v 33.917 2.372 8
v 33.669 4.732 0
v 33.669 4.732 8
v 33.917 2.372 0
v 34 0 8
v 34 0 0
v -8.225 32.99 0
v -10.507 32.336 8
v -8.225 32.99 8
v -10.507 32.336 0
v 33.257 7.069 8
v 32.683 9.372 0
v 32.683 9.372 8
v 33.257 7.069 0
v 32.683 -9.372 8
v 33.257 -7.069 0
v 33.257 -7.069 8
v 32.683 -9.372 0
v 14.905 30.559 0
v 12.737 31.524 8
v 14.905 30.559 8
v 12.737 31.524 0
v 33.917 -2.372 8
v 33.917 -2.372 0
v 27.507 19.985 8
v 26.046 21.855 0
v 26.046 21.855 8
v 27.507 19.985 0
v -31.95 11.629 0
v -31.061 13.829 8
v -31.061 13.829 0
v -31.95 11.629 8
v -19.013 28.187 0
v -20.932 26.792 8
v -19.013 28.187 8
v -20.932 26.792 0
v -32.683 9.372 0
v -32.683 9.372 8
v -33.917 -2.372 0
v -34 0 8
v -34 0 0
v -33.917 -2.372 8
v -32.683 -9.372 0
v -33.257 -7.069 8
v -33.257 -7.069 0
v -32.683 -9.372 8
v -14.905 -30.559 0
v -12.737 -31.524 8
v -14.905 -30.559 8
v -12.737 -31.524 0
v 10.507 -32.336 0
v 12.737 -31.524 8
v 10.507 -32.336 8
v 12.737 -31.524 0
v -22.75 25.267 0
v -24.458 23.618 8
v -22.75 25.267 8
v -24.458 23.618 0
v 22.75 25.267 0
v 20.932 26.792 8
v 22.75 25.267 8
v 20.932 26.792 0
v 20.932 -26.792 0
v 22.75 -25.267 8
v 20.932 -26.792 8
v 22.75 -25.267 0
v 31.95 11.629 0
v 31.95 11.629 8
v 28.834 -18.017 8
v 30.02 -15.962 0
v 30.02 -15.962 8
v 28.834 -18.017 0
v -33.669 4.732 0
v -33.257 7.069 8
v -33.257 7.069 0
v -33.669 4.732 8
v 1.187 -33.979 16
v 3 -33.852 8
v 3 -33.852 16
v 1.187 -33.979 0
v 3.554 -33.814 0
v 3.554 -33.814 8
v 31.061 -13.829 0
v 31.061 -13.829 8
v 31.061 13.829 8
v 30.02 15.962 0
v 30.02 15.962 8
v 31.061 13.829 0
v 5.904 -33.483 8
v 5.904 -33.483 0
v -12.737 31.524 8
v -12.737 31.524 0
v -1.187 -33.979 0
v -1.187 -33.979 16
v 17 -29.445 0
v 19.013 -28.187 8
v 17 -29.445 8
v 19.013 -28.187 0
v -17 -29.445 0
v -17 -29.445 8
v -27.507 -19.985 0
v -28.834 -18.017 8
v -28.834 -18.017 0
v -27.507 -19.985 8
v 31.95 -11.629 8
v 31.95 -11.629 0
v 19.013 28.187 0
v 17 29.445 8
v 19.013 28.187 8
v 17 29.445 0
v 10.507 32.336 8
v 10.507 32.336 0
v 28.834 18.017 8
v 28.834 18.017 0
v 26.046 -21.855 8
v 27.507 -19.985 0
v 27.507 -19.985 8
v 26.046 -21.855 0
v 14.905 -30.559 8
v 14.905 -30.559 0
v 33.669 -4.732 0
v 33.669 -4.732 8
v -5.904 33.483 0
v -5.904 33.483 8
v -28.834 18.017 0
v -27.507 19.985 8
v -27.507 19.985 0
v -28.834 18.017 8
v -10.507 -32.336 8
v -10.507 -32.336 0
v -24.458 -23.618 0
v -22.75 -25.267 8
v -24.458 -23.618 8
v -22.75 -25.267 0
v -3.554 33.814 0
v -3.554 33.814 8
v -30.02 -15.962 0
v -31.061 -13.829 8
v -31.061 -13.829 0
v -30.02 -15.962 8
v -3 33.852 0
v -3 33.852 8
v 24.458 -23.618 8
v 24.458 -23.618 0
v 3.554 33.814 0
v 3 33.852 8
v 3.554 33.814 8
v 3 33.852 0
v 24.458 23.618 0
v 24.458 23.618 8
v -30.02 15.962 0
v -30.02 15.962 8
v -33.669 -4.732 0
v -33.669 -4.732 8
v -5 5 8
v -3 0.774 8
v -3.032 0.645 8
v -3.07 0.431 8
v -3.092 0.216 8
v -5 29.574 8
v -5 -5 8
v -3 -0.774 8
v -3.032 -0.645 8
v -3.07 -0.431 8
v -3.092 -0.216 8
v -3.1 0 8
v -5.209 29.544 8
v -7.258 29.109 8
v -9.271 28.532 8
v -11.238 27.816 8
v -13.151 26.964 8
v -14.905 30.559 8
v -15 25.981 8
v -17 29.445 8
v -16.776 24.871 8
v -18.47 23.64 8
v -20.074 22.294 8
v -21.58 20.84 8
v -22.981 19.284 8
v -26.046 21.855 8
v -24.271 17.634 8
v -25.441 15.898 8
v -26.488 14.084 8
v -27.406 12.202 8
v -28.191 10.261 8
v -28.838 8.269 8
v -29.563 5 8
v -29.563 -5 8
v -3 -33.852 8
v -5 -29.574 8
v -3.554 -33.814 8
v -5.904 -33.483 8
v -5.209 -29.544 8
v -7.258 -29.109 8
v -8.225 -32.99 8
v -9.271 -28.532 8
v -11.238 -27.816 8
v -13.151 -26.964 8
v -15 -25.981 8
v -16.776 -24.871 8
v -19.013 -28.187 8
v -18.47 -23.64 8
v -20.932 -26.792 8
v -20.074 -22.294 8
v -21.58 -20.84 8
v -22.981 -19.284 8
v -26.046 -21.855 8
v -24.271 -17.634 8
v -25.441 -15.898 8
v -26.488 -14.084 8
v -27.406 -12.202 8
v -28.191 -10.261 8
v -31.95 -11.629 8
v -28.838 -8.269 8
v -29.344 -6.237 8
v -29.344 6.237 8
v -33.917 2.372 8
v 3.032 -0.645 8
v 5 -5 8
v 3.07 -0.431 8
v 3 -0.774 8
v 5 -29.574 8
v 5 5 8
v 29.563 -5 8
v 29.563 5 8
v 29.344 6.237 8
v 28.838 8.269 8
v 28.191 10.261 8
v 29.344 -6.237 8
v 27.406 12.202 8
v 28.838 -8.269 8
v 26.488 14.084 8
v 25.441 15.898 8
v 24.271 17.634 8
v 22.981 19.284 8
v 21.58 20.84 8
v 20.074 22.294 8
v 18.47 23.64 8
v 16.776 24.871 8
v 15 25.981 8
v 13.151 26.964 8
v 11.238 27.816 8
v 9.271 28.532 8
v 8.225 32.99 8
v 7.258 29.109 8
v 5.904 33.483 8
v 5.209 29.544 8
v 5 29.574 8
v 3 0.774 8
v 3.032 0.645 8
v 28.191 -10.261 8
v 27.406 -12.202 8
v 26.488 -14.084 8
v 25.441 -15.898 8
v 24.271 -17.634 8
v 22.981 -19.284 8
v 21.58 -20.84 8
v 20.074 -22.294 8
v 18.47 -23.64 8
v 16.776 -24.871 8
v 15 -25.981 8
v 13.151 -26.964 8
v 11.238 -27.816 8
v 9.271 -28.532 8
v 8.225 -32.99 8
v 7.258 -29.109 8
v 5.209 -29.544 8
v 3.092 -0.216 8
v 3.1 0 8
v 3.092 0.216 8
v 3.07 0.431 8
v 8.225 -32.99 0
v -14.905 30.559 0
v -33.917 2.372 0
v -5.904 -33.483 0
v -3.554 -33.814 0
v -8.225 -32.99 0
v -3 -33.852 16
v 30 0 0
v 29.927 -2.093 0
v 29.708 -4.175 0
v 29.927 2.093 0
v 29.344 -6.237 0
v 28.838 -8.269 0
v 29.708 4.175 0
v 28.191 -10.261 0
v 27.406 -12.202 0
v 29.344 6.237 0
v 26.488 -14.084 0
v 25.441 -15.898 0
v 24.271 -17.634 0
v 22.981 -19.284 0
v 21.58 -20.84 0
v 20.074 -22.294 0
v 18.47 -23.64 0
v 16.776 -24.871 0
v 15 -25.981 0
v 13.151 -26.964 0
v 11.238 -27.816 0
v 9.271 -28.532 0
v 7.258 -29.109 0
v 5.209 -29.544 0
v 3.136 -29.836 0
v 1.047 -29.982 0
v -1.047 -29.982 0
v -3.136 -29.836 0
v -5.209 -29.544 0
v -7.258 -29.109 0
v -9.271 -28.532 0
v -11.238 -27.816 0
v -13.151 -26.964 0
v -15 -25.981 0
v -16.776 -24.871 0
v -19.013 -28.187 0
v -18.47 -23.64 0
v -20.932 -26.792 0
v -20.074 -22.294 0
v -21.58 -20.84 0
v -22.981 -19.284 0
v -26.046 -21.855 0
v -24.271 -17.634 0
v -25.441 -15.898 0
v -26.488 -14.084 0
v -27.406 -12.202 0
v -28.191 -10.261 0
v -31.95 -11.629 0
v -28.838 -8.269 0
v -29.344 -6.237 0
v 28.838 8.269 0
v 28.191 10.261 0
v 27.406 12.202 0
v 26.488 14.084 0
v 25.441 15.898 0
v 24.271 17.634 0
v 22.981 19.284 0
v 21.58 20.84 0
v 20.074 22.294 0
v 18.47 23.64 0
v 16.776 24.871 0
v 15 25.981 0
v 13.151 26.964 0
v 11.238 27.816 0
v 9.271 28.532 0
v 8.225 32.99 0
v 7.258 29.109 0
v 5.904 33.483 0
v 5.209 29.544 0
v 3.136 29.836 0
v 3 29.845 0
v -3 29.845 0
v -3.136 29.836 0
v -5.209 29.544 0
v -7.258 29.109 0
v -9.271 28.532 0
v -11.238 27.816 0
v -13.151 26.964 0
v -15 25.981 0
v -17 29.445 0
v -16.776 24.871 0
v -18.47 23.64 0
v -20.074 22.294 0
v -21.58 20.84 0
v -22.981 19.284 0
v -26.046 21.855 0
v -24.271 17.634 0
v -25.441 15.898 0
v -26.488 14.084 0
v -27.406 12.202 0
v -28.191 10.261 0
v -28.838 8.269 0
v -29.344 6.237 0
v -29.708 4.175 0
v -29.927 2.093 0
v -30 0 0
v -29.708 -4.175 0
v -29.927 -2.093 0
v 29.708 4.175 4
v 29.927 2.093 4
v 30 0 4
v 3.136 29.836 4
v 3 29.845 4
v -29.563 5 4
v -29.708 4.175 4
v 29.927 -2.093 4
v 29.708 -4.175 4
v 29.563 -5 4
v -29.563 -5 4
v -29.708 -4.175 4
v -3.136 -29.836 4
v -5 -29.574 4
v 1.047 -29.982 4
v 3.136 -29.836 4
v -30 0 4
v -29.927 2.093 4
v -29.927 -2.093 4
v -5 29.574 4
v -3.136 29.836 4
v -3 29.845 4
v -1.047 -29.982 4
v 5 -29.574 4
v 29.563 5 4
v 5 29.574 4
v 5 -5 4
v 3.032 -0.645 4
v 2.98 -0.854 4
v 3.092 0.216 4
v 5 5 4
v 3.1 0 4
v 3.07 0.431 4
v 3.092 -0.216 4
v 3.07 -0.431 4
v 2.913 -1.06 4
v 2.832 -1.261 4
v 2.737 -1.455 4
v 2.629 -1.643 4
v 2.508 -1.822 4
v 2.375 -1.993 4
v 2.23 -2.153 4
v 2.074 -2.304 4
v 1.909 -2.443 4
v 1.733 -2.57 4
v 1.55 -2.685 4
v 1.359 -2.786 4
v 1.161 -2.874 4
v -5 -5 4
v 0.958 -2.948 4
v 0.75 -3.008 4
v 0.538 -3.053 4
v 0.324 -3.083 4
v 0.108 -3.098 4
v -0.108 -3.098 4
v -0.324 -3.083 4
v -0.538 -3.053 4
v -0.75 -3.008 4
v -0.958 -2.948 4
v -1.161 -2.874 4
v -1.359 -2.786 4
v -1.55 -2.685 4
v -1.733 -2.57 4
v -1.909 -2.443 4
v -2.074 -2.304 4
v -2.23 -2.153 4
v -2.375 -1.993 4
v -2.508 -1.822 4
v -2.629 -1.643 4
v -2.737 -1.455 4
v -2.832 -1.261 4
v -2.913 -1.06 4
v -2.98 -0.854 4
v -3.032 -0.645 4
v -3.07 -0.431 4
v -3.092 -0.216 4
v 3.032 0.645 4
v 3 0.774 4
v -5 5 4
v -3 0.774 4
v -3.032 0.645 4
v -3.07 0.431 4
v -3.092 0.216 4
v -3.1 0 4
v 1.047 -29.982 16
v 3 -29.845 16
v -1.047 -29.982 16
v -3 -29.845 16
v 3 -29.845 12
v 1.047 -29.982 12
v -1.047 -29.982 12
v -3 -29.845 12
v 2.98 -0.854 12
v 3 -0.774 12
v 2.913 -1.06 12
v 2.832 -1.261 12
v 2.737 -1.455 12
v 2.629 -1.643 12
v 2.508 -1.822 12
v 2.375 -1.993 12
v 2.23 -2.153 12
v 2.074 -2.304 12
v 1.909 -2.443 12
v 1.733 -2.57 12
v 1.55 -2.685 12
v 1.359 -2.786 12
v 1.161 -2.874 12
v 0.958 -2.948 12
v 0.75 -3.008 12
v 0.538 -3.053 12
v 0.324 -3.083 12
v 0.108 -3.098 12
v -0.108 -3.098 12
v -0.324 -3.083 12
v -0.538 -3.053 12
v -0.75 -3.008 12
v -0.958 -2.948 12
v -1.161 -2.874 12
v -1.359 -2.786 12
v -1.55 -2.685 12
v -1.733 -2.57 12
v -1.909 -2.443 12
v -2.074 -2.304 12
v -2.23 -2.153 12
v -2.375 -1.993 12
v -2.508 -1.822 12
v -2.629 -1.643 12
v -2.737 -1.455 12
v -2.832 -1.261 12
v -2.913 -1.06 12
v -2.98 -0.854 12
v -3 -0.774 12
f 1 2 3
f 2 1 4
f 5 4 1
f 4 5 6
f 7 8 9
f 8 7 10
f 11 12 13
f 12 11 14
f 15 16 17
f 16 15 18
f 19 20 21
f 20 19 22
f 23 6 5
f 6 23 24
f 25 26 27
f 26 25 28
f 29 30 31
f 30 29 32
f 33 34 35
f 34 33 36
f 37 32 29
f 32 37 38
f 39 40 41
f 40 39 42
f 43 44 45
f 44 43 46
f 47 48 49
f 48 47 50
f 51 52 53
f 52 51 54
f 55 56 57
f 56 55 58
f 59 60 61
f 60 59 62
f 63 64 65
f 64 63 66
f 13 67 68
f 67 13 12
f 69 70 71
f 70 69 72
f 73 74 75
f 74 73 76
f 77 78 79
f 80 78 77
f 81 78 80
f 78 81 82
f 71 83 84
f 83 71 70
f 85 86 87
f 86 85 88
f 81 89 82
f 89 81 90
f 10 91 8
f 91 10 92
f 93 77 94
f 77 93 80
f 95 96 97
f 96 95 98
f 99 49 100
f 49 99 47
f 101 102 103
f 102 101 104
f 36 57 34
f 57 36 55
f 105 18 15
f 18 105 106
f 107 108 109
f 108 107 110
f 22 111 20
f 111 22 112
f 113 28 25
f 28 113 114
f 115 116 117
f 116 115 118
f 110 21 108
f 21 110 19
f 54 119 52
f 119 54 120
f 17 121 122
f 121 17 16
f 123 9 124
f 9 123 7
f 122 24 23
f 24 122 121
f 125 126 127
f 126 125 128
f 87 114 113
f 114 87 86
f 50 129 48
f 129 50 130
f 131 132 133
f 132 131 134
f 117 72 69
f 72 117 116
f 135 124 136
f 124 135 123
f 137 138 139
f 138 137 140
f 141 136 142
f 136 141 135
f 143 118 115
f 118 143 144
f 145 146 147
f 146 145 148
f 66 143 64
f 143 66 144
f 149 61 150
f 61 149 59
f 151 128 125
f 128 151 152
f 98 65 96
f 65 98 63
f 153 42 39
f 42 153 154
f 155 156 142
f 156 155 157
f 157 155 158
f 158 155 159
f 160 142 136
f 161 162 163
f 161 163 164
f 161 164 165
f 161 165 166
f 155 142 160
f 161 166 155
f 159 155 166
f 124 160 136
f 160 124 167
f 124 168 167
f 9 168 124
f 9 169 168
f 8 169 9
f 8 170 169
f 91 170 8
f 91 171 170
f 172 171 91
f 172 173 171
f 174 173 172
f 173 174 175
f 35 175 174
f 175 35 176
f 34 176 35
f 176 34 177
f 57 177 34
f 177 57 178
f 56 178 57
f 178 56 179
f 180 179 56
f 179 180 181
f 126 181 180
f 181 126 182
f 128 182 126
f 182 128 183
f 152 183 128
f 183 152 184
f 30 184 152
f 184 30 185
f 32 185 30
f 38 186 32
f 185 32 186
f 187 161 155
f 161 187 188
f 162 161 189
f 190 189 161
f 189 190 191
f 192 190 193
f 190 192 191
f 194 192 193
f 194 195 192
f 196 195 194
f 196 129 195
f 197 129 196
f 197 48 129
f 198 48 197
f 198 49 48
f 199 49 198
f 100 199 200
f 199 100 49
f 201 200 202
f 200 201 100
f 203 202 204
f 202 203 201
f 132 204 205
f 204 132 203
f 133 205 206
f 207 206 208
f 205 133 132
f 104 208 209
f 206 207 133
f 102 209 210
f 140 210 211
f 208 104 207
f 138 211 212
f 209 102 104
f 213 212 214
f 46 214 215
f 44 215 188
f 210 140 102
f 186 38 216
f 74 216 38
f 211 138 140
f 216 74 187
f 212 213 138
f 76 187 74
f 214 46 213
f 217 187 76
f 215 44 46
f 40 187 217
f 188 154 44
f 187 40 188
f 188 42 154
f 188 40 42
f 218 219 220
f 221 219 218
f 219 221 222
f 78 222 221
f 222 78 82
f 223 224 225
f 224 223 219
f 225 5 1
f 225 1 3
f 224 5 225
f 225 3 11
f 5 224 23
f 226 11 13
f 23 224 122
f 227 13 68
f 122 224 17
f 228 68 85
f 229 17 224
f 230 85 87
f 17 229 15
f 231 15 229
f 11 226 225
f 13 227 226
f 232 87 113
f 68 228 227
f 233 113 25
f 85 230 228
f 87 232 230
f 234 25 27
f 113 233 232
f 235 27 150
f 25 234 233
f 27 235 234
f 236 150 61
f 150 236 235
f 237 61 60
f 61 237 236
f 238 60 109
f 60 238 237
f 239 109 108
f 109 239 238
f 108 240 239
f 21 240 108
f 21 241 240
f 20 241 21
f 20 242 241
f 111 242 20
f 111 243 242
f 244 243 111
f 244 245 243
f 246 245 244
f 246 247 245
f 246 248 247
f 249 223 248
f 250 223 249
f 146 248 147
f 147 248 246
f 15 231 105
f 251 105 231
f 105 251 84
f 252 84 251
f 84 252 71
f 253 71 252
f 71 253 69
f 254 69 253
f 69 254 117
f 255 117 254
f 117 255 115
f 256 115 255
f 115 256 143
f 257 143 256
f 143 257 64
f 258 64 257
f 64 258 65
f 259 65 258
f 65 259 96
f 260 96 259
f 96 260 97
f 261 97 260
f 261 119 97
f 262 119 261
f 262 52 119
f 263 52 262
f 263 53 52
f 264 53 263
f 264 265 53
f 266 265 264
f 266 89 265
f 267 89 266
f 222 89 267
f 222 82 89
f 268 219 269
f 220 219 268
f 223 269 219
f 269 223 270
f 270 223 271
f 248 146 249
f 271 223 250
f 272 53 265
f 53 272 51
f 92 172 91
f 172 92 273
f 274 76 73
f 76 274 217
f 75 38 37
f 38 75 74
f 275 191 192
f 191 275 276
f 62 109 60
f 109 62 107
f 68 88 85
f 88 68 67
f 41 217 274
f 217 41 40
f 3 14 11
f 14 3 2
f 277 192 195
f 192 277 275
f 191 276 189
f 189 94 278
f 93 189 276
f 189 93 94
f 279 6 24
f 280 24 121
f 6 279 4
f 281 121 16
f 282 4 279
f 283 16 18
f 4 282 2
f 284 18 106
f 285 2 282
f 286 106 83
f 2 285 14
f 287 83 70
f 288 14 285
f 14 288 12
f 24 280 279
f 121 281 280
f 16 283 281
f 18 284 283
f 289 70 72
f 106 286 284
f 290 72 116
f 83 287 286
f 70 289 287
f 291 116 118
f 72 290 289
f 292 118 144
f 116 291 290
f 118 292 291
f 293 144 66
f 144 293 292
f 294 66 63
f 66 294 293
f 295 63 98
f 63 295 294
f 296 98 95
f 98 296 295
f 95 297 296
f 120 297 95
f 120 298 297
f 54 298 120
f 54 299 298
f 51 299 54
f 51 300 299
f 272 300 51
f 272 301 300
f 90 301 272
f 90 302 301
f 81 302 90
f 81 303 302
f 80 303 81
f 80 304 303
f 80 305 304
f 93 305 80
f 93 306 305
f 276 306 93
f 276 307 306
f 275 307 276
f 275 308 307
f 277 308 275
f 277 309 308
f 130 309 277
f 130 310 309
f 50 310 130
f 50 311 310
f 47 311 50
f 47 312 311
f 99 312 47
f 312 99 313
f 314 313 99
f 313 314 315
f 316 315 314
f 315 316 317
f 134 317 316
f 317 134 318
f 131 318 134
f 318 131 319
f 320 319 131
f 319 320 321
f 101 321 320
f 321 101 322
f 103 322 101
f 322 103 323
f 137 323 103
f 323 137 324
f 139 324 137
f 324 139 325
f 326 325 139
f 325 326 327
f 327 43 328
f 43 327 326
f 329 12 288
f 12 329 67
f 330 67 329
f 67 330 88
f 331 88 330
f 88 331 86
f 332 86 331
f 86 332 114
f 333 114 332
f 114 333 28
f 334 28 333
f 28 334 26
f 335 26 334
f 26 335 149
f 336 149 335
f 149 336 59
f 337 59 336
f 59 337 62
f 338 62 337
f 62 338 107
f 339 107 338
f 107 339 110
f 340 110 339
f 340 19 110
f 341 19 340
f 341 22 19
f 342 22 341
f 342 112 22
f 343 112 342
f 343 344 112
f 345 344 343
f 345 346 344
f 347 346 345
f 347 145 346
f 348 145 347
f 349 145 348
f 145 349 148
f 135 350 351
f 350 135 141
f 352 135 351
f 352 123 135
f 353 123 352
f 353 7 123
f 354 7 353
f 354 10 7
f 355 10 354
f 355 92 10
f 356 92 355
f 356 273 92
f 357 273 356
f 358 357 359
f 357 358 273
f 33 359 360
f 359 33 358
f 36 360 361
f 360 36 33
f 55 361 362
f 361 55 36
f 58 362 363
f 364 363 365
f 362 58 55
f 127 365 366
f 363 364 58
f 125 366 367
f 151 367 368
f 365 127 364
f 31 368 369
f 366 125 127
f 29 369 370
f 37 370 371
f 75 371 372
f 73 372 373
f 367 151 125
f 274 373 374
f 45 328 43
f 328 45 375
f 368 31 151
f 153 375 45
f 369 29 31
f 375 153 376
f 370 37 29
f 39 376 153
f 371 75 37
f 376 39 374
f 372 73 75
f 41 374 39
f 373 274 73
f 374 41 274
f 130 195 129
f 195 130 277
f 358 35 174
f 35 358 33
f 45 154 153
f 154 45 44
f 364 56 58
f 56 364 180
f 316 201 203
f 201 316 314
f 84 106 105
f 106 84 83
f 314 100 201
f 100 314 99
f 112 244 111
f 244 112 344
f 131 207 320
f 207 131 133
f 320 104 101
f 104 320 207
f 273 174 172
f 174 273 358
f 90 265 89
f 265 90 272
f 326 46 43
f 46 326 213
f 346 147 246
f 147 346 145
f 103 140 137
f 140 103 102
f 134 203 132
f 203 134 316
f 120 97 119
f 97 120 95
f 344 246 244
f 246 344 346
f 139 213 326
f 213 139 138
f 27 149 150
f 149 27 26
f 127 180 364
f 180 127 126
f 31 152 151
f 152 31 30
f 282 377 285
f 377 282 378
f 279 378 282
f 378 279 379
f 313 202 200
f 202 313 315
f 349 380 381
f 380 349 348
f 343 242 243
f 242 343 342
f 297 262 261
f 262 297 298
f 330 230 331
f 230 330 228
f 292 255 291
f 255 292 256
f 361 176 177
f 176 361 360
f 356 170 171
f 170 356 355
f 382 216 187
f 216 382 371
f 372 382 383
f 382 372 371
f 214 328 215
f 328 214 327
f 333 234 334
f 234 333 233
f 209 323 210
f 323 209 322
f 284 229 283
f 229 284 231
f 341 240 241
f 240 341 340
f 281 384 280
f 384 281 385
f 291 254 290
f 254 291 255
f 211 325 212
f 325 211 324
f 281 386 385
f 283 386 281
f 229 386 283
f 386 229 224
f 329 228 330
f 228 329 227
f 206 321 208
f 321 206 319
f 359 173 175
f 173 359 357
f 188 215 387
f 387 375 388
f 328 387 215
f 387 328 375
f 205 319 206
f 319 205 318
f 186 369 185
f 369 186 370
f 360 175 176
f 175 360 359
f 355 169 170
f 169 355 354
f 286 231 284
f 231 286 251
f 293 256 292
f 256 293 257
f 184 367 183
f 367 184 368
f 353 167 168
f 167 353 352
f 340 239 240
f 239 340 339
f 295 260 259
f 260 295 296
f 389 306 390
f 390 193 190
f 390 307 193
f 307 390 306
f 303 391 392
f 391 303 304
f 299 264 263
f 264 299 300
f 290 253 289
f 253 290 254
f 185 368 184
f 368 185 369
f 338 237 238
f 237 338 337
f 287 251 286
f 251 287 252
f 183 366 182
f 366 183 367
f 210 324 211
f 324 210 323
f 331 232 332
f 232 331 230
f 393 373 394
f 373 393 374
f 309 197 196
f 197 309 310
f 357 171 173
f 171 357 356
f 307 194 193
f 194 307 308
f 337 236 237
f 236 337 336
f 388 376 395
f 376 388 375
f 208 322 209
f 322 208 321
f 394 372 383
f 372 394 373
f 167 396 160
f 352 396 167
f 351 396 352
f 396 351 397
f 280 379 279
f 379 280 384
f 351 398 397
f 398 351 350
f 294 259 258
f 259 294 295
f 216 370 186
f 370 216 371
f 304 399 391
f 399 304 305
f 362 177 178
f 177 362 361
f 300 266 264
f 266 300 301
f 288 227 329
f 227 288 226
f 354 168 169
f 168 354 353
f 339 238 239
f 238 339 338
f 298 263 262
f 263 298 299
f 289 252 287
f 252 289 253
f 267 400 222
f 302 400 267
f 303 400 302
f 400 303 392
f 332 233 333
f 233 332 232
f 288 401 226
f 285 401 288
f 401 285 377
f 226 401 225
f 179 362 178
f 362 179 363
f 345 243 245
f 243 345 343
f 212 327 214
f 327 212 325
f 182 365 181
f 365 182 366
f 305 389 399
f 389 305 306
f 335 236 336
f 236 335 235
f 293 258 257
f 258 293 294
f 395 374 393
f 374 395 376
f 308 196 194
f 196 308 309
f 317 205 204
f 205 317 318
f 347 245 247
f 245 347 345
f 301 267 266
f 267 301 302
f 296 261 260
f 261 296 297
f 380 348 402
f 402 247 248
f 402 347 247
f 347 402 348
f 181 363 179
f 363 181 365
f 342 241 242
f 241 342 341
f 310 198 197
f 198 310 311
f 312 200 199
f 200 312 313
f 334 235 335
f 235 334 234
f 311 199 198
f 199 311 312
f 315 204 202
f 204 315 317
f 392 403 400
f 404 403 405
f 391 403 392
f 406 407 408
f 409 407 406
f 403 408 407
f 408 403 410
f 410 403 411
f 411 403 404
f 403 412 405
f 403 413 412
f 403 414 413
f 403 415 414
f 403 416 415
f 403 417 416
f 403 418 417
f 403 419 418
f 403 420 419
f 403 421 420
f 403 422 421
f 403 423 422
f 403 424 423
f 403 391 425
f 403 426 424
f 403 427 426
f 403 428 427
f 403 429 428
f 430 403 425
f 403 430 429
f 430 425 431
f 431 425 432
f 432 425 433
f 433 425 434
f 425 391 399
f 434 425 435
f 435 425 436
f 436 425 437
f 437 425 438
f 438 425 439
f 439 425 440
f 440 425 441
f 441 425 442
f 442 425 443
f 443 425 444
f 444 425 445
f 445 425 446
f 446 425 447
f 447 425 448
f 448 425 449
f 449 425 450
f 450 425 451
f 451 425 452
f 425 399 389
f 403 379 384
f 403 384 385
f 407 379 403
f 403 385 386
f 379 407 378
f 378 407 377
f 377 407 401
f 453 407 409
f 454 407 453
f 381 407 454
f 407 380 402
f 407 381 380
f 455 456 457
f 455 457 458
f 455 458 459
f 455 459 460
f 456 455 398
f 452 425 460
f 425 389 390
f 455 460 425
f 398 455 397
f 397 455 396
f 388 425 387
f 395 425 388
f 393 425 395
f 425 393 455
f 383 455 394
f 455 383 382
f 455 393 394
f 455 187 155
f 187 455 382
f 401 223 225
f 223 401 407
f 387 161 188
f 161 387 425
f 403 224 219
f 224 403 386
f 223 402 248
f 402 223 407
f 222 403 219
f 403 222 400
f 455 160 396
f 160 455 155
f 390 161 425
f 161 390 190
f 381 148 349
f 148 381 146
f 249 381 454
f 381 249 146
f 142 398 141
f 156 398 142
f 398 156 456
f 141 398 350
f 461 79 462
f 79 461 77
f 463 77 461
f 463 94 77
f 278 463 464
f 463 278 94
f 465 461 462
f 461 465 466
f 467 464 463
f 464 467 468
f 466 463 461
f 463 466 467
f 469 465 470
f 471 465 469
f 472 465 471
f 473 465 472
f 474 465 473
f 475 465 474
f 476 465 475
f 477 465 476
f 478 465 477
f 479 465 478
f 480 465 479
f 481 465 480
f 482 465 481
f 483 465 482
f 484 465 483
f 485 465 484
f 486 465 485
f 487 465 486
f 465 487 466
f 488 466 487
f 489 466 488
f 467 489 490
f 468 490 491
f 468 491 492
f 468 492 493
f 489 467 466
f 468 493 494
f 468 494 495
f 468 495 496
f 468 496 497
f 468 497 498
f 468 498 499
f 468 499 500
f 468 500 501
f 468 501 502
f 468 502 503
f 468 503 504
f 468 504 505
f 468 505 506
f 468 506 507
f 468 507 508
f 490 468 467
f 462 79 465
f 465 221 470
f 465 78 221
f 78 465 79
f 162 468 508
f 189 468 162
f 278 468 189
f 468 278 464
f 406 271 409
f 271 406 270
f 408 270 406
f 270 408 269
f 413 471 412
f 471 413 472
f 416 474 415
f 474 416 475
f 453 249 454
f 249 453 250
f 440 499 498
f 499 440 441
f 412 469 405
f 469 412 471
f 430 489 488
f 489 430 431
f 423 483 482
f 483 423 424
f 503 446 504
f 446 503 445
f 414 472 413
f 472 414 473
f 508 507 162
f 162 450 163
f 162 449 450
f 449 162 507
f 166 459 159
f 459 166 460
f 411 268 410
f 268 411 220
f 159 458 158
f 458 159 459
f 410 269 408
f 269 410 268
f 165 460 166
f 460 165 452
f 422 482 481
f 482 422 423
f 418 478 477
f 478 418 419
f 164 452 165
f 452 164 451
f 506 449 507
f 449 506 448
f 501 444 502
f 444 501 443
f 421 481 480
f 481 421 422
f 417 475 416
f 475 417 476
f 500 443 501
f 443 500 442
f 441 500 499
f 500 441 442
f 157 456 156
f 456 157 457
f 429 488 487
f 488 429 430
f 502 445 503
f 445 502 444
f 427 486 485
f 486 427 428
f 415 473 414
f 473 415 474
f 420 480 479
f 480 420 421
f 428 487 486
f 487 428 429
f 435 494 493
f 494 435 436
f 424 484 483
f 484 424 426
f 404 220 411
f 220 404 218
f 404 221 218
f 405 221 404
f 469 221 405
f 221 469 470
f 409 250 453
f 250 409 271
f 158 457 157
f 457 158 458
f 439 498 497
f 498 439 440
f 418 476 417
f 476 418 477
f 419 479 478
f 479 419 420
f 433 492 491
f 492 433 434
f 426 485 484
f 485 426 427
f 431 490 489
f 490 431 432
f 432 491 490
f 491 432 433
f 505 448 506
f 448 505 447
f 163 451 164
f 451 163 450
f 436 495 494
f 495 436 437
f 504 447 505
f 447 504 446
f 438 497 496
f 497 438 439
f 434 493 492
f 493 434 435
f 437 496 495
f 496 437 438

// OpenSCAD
//rayon du cercle exterieur (30)
a=30;
//Epaisseur du cercle exterieur (4)
b=4;
//hauteur du cercle exterieur (8)
c=8;
//largeur des cubes internes (10)
d=10;
//hauteur des cubes internes (4)
e=4;
//largeur des cubes d'emboitement (6)
f=6;
//rayon du cercle interieur (3)
g=3;
difference(){
union(){
difference(){
union(){
difference(){
cylinder (r=a+b, h=c,$fn=90);
cylinder ( r=a, h=c,$fn=90);}
translate([-a,-d/2,c-e]) cube([a*2,d,e]);
translate([-d/2,-a,c-e]) cube([d,a*2,e]);}
union(){
    color("red") translate([-f/2,0,0]) cube([f,a+b+1,c]);
    color("red") cylinder (r=g, h=c,$fn=90);}
}
translate([0,0,c*2]) rotate([0,180,180]) intersection(){
union(){
difference(){
cylinder (r=a+b, h=c,$fn=90);
cylinder ( r=a, h=c,$fn=90);}
translate([-a,-d/2,c-e]) cube([a*2,d,e]);
translate([-d/2,-a,c-e]) cube([d,a*2,e]);}
union(){
    color("red") translate([-f/2,0,0]) cube([f,a+b+1,c]);
    color("red") cylinder (r=g, h=c,$fn=90);}
}}
color("blue") cylinder (r=g+0.1, h=c*2,$fn=90);}
